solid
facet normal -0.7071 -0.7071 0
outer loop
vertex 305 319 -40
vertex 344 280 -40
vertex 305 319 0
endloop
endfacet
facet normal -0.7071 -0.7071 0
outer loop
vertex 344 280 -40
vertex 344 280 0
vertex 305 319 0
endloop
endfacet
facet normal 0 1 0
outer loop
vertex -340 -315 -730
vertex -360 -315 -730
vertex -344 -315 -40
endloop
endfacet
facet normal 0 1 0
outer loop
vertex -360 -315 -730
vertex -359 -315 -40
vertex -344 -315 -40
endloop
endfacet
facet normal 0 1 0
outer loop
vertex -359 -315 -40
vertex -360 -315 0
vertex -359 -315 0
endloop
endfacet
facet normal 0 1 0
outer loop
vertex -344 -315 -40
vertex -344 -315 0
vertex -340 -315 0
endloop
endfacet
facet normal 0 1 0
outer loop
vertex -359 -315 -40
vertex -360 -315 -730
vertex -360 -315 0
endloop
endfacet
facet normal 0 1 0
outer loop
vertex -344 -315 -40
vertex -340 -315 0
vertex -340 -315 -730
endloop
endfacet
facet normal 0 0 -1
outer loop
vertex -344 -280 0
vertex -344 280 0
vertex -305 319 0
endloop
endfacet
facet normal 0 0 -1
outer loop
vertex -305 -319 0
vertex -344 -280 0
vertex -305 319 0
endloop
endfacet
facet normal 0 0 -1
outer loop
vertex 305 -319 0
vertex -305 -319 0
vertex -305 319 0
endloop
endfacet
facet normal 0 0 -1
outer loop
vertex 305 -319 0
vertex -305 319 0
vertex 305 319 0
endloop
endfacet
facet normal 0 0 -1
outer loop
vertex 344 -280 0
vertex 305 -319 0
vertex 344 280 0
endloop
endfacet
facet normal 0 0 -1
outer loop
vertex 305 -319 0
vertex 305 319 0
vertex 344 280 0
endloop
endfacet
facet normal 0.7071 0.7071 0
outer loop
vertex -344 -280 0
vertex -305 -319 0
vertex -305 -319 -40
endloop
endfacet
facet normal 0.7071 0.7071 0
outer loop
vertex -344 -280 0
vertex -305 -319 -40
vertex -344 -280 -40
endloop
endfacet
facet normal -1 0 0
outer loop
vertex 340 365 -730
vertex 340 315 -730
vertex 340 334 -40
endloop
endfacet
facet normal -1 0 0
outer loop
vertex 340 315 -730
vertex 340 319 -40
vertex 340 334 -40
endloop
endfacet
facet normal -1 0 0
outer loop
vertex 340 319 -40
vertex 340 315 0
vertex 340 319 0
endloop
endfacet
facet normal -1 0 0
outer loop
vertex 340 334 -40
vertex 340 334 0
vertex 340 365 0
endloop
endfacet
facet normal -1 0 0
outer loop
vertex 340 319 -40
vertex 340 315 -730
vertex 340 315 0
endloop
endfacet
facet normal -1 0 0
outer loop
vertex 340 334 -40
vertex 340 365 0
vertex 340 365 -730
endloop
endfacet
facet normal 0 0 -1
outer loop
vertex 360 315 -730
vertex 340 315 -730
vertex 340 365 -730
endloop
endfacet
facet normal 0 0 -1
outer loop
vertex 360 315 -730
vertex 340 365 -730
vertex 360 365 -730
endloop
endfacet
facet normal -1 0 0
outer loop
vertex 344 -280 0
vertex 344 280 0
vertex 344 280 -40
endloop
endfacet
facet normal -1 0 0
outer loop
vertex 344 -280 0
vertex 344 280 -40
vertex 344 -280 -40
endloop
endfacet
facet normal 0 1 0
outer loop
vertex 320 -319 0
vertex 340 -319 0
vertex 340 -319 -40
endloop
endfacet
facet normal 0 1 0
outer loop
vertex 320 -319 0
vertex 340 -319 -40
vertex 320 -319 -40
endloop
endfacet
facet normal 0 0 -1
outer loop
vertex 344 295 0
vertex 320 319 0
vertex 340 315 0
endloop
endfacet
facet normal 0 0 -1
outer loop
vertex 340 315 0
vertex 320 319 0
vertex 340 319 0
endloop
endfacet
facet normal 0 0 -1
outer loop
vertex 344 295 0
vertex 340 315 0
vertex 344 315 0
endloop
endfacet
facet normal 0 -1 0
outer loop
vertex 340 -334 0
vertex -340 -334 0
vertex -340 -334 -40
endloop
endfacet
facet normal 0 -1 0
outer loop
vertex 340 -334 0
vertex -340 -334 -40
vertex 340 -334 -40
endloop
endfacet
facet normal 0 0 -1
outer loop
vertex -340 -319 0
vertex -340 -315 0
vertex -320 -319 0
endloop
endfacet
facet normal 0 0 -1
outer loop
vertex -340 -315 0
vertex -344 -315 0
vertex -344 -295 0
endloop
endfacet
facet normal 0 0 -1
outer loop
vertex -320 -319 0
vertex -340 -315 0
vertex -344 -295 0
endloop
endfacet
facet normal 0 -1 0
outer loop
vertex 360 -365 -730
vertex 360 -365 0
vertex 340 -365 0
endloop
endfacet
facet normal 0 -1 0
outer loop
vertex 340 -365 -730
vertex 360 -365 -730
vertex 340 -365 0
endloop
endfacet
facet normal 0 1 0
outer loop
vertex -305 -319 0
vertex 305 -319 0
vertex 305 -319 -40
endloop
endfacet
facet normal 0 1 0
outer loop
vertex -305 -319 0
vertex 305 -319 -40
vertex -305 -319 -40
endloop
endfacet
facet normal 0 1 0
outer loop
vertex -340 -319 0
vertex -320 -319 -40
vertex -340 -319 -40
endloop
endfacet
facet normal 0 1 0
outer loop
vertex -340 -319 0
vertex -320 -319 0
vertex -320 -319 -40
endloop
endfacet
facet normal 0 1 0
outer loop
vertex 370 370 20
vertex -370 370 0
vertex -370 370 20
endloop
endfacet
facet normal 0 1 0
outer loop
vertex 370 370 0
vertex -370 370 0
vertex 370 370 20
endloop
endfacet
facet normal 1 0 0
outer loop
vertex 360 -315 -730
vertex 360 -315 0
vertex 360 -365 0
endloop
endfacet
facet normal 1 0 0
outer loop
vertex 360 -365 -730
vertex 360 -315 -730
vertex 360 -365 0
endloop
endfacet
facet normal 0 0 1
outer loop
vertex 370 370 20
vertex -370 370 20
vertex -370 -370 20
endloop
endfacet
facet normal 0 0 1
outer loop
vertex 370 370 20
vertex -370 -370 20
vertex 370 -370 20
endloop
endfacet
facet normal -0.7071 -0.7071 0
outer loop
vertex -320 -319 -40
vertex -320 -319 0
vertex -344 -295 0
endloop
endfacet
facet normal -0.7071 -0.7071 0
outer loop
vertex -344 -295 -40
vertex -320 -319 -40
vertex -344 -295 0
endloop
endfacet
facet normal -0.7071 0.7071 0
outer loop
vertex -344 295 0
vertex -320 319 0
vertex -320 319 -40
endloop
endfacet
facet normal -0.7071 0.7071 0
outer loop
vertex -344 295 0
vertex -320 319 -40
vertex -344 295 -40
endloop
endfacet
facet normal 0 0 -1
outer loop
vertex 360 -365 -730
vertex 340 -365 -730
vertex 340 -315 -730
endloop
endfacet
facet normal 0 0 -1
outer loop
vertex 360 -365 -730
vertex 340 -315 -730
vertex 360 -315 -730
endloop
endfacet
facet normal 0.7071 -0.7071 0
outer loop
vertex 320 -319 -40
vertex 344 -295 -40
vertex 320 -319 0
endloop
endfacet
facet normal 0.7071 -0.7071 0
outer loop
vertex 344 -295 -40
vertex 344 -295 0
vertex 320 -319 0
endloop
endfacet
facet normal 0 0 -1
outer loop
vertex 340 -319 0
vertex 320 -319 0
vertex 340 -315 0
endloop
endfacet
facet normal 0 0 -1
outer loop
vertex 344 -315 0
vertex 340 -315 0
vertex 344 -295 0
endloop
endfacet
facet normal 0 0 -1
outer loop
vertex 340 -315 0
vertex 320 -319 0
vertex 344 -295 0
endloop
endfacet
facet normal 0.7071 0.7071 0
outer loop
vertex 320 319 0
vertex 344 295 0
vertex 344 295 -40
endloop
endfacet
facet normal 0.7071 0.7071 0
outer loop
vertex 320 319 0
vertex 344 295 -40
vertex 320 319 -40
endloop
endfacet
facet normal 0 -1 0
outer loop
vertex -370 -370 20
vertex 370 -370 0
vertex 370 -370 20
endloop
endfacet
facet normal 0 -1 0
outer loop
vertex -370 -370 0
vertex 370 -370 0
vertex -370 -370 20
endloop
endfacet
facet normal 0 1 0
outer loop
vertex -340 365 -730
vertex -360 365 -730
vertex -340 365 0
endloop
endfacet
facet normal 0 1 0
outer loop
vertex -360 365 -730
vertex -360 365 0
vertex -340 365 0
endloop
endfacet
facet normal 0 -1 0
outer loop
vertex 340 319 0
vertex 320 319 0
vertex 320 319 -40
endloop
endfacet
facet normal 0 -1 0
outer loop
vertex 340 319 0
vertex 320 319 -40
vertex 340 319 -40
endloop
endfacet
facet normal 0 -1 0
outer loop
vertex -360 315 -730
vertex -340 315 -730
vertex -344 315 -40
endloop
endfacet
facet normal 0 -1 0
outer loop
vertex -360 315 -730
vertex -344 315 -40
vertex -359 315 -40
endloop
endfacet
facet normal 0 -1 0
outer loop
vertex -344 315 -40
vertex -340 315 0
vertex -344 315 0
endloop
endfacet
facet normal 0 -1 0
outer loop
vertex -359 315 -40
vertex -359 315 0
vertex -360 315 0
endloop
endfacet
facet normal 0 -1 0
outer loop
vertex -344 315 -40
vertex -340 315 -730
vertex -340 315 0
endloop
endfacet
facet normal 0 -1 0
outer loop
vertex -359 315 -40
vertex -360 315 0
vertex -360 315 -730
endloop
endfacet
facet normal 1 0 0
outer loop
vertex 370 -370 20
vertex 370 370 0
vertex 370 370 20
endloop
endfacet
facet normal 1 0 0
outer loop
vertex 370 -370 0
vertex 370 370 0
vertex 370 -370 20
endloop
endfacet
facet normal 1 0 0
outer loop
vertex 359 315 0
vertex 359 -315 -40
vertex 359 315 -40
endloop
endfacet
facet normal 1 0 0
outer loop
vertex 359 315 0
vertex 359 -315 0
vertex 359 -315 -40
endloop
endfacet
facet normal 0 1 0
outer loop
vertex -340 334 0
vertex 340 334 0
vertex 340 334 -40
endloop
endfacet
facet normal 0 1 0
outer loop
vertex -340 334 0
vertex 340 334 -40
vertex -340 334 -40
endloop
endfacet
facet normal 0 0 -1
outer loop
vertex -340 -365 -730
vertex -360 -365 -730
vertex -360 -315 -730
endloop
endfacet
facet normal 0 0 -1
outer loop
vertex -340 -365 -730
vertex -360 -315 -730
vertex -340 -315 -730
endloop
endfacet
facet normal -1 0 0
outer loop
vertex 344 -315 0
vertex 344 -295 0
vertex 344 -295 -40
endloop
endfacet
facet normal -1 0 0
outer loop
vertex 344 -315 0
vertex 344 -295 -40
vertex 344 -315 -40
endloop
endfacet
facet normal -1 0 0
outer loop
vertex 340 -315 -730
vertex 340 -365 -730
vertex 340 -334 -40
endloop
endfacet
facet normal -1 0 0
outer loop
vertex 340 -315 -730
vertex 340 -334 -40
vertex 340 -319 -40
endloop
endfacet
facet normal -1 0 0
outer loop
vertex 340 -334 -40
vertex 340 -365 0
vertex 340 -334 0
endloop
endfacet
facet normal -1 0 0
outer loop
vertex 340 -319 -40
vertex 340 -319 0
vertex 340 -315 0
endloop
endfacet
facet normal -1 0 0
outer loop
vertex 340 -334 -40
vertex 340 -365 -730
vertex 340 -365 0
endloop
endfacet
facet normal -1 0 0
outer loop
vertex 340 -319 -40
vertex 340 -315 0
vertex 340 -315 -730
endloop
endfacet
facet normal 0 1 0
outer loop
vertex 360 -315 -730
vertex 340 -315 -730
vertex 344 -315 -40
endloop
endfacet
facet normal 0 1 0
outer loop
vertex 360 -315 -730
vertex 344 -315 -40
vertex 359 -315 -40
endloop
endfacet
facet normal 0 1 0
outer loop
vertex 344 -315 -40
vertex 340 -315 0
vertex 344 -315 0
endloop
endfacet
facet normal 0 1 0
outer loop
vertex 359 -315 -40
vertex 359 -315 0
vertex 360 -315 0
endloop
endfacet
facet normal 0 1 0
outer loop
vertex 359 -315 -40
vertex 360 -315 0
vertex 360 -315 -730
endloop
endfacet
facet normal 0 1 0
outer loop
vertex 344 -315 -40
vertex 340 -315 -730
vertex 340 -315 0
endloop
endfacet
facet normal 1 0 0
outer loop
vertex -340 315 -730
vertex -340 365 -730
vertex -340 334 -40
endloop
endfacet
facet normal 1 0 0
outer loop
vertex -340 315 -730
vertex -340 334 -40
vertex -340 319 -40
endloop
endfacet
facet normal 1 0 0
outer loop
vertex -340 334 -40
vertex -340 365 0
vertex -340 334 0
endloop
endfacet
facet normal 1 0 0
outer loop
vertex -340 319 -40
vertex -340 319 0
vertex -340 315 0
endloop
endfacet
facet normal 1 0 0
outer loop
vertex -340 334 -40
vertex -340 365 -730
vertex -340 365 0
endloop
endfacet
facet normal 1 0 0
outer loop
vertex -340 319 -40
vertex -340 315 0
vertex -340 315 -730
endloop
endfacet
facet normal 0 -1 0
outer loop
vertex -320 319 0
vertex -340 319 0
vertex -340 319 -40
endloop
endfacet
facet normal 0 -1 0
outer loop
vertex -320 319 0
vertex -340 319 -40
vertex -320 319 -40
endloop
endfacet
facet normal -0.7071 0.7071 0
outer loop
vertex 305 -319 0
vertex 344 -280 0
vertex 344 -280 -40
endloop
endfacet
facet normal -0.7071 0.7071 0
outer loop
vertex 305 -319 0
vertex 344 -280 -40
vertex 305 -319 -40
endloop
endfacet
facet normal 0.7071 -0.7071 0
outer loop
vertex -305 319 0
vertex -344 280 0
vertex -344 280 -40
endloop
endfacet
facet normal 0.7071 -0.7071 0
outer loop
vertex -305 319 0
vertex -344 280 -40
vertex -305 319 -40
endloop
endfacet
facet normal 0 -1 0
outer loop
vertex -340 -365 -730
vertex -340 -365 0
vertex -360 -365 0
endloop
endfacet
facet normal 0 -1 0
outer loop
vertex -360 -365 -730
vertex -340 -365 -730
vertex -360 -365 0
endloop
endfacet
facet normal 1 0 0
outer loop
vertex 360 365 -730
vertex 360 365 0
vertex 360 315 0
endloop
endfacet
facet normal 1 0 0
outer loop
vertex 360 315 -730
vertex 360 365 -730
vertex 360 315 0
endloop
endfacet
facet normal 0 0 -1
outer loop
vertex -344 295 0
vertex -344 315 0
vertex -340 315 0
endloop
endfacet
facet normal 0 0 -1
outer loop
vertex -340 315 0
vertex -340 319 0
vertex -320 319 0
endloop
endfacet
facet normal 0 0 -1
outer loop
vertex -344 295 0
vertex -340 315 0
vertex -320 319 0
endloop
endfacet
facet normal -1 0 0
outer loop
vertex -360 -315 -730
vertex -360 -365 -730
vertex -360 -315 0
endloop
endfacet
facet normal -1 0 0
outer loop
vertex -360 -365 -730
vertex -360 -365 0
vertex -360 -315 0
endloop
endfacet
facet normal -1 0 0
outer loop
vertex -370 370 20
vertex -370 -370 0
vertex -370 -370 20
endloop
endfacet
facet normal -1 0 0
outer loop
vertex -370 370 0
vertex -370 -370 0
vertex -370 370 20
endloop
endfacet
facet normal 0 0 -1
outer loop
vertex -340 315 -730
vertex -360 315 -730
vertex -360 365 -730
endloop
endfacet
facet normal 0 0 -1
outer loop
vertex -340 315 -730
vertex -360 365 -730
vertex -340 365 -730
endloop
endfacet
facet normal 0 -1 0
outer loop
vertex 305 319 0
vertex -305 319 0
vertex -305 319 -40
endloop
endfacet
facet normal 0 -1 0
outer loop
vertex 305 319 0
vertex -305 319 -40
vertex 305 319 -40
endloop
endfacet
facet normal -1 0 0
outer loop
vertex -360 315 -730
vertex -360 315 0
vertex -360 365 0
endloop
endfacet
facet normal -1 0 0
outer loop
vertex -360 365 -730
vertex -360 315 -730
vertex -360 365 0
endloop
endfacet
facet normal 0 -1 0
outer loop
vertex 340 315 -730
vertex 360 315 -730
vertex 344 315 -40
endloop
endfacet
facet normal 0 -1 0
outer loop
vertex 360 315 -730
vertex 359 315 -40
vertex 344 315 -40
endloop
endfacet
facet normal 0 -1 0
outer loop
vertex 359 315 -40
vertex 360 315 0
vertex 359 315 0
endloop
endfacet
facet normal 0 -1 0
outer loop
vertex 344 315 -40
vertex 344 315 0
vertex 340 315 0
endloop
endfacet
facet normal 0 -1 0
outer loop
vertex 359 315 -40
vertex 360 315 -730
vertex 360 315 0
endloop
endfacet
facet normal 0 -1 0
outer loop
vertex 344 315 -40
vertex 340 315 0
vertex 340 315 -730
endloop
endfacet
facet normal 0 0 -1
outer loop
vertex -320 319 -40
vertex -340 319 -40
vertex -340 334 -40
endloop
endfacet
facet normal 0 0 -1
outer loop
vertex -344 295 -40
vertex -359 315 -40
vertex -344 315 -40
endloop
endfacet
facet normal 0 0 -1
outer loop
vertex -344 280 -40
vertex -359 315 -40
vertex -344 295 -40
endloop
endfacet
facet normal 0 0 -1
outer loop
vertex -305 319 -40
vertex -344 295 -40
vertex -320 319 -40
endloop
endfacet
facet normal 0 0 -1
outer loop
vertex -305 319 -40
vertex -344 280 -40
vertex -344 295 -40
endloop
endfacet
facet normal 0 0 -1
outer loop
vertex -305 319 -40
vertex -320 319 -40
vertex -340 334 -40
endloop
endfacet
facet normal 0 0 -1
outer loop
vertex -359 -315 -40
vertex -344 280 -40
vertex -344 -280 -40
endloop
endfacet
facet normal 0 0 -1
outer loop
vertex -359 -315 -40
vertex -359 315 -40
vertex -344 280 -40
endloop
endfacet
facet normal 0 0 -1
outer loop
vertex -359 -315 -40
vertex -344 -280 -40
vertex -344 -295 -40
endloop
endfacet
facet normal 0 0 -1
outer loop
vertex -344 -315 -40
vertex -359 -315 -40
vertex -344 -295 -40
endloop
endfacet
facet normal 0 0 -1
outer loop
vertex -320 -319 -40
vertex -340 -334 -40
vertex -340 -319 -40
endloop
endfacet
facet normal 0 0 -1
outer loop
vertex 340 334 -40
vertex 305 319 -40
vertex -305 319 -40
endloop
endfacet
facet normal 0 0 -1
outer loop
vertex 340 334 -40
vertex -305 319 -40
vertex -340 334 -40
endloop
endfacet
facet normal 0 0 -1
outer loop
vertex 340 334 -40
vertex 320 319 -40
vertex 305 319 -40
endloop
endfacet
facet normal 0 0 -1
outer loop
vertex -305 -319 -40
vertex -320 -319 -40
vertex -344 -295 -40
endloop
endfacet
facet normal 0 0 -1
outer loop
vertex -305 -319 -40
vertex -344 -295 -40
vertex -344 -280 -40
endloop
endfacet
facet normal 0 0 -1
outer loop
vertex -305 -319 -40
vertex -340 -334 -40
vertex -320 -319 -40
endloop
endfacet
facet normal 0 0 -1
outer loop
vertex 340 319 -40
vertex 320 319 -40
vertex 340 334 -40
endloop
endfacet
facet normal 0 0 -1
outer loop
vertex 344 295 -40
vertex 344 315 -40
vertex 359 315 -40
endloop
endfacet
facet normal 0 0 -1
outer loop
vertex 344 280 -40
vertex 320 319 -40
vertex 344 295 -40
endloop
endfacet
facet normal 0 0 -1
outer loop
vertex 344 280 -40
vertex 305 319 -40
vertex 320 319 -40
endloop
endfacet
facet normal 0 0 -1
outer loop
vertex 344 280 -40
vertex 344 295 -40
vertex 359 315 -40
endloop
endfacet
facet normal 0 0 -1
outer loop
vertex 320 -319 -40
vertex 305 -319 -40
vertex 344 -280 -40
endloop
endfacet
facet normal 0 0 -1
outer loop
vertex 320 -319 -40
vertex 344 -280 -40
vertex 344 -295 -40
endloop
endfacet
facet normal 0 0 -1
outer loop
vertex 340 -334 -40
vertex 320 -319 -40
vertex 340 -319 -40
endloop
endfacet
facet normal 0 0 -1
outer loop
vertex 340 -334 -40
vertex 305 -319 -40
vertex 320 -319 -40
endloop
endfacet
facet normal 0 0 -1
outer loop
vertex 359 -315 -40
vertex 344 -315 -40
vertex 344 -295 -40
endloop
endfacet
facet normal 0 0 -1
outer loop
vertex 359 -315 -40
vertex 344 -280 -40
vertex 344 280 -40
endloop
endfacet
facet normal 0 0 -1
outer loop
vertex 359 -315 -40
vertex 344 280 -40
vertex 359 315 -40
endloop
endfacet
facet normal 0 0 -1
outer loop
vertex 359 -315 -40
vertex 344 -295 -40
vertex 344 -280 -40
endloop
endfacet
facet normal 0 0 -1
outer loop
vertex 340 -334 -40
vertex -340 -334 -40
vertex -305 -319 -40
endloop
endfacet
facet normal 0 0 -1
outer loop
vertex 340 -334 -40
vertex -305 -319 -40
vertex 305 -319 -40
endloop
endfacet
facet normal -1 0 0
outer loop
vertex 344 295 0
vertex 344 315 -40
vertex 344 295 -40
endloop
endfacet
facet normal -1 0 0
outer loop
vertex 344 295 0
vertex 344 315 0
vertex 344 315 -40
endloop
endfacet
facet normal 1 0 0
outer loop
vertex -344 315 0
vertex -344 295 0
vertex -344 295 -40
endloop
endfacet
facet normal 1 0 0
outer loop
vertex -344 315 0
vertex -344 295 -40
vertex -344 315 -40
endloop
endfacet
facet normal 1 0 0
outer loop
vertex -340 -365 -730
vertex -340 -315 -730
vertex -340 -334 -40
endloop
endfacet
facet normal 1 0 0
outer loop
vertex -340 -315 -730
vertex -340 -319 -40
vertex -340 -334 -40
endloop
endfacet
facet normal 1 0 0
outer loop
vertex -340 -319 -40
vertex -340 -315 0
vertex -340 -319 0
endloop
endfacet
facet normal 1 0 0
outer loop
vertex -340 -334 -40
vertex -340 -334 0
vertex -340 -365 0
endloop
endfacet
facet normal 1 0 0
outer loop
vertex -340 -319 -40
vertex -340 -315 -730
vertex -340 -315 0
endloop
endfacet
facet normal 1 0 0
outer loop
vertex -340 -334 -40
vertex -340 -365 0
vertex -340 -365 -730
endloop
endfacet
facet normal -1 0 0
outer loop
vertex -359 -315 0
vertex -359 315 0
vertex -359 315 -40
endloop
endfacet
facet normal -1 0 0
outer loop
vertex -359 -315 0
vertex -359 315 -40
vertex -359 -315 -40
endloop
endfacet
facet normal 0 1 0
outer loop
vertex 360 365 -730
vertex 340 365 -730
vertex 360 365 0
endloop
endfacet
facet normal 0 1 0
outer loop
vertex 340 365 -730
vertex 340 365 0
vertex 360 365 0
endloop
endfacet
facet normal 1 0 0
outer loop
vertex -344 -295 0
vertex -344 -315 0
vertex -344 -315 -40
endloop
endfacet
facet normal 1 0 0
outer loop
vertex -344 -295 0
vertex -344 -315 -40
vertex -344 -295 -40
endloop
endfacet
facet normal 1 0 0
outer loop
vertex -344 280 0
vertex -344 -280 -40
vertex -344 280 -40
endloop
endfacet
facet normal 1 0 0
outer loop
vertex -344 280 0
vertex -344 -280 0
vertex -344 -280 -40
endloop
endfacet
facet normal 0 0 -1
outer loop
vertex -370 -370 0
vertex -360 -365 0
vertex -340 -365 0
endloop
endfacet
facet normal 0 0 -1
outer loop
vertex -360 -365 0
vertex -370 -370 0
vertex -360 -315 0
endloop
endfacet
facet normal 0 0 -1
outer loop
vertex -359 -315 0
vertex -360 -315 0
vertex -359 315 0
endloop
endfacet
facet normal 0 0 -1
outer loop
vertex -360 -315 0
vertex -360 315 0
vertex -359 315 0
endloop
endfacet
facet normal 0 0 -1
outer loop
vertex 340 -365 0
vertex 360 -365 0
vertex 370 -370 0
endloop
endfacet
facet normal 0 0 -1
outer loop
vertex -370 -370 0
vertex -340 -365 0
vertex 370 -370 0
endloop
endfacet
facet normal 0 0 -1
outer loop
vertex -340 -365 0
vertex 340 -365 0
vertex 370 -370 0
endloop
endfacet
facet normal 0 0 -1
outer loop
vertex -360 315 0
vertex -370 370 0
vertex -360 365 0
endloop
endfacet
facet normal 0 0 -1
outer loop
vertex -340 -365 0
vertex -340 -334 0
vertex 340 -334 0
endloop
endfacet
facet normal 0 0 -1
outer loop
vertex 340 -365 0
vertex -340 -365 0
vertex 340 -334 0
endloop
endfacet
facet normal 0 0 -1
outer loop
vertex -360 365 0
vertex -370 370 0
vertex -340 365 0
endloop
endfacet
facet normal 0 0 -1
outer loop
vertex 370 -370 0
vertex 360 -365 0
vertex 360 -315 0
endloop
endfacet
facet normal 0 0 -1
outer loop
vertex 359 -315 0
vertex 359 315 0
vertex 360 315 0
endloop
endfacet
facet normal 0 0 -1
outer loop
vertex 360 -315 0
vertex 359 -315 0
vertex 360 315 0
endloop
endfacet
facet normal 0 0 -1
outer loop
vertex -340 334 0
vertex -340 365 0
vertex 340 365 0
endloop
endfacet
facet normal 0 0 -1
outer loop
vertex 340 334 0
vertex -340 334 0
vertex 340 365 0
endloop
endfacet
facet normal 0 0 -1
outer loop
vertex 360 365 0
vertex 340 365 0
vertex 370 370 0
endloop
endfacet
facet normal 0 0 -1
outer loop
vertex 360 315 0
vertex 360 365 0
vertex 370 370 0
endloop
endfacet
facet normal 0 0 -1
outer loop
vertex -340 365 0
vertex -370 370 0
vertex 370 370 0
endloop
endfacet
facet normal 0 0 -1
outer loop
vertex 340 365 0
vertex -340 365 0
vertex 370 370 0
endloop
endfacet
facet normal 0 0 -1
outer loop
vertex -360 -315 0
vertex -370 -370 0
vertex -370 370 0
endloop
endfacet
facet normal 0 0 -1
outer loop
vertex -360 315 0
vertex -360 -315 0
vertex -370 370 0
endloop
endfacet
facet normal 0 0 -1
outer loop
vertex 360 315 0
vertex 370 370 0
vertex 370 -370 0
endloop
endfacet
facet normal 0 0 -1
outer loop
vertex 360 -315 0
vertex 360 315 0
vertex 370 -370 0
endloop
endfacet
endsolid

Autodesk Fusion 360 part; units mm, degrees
sketch "Sketch1" plane through (0, 0, 0) normal (0, 0, 1) x (1, 0, 0)
  line L0 (-370, 370) -> (370, 370)
  line L1 (370, 370) -> (370, -370)
  line L2 (370, -370) -> (-370, -370)
  line L3 (-370, -370) -> (-370, 370)
  dimension "d1" = 740
  dimension "d2" = 370
  dimension "d3" = 740
  dimension "d4" = 370
extrude "Extrude1" add sketch "Sketch1" along normal blind 20
sketch "Sketch3" plane through (0, 0, 0) normal (0, 0, -1) x (1, 0, 0)
  line L0 (370, 370) -> (-370, 370)
  line L1 (-370, 370) -> (-370, -370)
  line L2 (-370, -370) -> (370, -370)
  line L3 (370, -370) -> (370, 370)
  line L4 (360, 365) -> (340, 365)
  line L5 (340, 365) -> (340, 315)
  line L6 (340, 315) -> (360, 315)
  line L7 (360, 315) -> (360, 365)
  line L8 (360, -315) -> (340, -315)
  line L9 (340, -315) -> (340, -365)
  line L10 (340, -365) -> (360, -365)
  line L11 (360, -365) -> (360, -315)
  line L12 (-340, -315) -> (-360, -315)
  line L13 (-360, -315) -> (-360, -365)
  line L14 (-360, -365) -> (-340, -365)
  line L15 (-340, -365) -> (-340, -315)
  line L16 (-340, 365) -> (-360, 365)
  line L17 (-360, 365) -> (-360, 315)
  line L18 (-360, 315) -> (-340, 315)
  line L19 (-340, 315) -> (-340, 365)
  dimension "d7" = 50
  dimension "d8" = 20
  dimension "d9" = 10
  dimension "d10" = 5
  dimension "d11" = 20
  dimension "d12" = 10
  dimension "d13" = 5
  dimension "d14" = 50
extrude "Extrude2" add sketch "Sketch3" along normal blind 730 contours L4 L5 L6 L7 | L8 L9 L10 L11 | L12 L13 L14 L15 | L16 L17 L18 L19
sketch "Sketch4" plane through (0, 0, 0) normal (0, 0, -1) x (1, 0, 0)
  line L0 (-340, 315) -> (-360, 315)
  line L1 (-360, 315) -> (-360, 365)
  line L2 (-360, 365) -> (-340, 365)
  line L3 (-340, 365) -> (-340, 315)
  line L4 (360, 315) -> (340, 315)
  line L5 (340, 315) -> (340, 365)
  line L6 (340, 365) -> (360, 365)
  line L7 (360, 365) -> (360, 315)
  line L8 (-340, -365) -> (-360, -365)
  line L9 (-360, -365) -> (-360, -315)
  line L10 (-360, -315) -> (-340, -315)
  line L11 (-340, -315) -> (-340, -365)
  line L12 (360, -365) -> (340, -365)
  line L13 (340, -365) -> (340, -315)
  line L14 (340, -315) -> (360, -315)
  line L15 (360, -315) -> (360, -365)
  line L16 (370, 370) -> (-370, 370)
  line L17 (-370, 370) -> (-370, -370)
  line L18 (-370, -370) -> (370, -370)
  line L19 (370, -370) -> (370, 370)
  line L20 (-340, 334) -> (340, 334)
  line L21 (340, 334) -> (340, 319)
  line L22 (340, 319) -> (-340, 319)
  line L23 (-340, 319) -> (-340, 334)
  line L24 (-340, -319) -> (340, -319)
  line L25 (340, -319) -> (340, -334)
  line L26 (340, -334) -> (-340, -334)
  line L27 (-340, -334) -> (-340, -319)
  line L28 (344, 315) -> (359, 315)
  line L29 (359, 315) -> (359, -315)
  line L30 (359, -315) -> (344, -315)
  line L31 (344, -315) -> (344, 315)
  line L32 (-359, 315) -> (-344, 315)
  line L33 (-344, 315) -> (-344, -315)
  line L34 (-344, -315) -> (-359, -315)
  line L35 (-359, -315) -> (-359, 315)
  dimension "d17" = 15
  dimension "d18" = 15
  dimension "d19" = 15
  dimension "d20" = 15
  dimension "d21" = 630
  dimension "d22" = 680
  dimension "d23" = 55
  dimension "d24" = 30
  dimension "d25" = 11
  dimension "d26" = 11
  dimension "d27" = 4
  dimension "d28" = 4
extrude "Extrude3" add sketch "Sketch4" along normal blind 40 contours L0 L10 L32 L33 L34 L35 | L3 L5 L20 L21 L22 L23 | L11 L13 L24 L25 L26 L27 | L4 L14 L28 L29 L30 L31
sketch "Sketch5" plane through (0, 0, 0) normal (0, 0, -1) x (1, 0, 0)
  line L0 (344, -315) -> (344, 315)
  line L1 (344, 315) -> (340, 315)
  line L2 (340, 315) -> (340, 319)
  line L3 (340, 319) -> (-340, 319)
  line L4 (-340, 319) -> (-340, 315)
  line L5 (-340, 315) -> (-344, 315)
  line L6 (-344, 315) -> (-344, -315)
  line L7 (-344, -315) -> (-340, -315)
  line L8 (-340, -315) -> (-340, -319)
  line L9 (-340, -319) -> (340, -319)
  line L10 (340, -319) -> (340, -315)
  line L11 (340, -315) -> (344, -315)
  line L12 (344, -295) -> (320, -319)
  line L13 (344, -280) -> (305, -319)
  line L14 (-320, -319) -> (-344, -295)
  line L15 (-344, -280) -> (-305, -319)
  line L16 (344, 295) -> (320, 319)
  line L17 (344, 280) -> (305, 319)
  line L18 (-320, 319) -> (-344, 295)
  line L19 (-305, 319) -> (-344, 280)
  dimension "d31" = 45
  dimension "d32" = 45
  dimension "d33" = 20
  dimension "d34" = 15
  dimension "d35" = 45
  dimension "d36" = 45
  dimension "d37" = 15
  dimension "d38" = 20
  dimension "d39" = 45
  dimension "d40" = 45
  dimension "d41" = 20
  dimension "d42" = 15
  dimension "d43" = 45
  dimension "d44" = 45
  dimension "d45" = 20
  dimension "d46" = 15
extrude "Extrude4" add sketch "Sketch5" along normal blind 40 contours L0 L9 L12 L13 | L0 L3 L16 L17 | L6 L9 L14 L15 | L3 L6 L18 L19
equation "d2 = ( 740 / 2 ) * 1 mm"
equation "d4 = ( 740 / 2 ) * 1 mm"
equation "d23 = ( ( 740 - 630 ) / 2 ) * 1 mm"
equation "d24 = ( ( 740 - 680 ) / 2 ) * 1 mm"
